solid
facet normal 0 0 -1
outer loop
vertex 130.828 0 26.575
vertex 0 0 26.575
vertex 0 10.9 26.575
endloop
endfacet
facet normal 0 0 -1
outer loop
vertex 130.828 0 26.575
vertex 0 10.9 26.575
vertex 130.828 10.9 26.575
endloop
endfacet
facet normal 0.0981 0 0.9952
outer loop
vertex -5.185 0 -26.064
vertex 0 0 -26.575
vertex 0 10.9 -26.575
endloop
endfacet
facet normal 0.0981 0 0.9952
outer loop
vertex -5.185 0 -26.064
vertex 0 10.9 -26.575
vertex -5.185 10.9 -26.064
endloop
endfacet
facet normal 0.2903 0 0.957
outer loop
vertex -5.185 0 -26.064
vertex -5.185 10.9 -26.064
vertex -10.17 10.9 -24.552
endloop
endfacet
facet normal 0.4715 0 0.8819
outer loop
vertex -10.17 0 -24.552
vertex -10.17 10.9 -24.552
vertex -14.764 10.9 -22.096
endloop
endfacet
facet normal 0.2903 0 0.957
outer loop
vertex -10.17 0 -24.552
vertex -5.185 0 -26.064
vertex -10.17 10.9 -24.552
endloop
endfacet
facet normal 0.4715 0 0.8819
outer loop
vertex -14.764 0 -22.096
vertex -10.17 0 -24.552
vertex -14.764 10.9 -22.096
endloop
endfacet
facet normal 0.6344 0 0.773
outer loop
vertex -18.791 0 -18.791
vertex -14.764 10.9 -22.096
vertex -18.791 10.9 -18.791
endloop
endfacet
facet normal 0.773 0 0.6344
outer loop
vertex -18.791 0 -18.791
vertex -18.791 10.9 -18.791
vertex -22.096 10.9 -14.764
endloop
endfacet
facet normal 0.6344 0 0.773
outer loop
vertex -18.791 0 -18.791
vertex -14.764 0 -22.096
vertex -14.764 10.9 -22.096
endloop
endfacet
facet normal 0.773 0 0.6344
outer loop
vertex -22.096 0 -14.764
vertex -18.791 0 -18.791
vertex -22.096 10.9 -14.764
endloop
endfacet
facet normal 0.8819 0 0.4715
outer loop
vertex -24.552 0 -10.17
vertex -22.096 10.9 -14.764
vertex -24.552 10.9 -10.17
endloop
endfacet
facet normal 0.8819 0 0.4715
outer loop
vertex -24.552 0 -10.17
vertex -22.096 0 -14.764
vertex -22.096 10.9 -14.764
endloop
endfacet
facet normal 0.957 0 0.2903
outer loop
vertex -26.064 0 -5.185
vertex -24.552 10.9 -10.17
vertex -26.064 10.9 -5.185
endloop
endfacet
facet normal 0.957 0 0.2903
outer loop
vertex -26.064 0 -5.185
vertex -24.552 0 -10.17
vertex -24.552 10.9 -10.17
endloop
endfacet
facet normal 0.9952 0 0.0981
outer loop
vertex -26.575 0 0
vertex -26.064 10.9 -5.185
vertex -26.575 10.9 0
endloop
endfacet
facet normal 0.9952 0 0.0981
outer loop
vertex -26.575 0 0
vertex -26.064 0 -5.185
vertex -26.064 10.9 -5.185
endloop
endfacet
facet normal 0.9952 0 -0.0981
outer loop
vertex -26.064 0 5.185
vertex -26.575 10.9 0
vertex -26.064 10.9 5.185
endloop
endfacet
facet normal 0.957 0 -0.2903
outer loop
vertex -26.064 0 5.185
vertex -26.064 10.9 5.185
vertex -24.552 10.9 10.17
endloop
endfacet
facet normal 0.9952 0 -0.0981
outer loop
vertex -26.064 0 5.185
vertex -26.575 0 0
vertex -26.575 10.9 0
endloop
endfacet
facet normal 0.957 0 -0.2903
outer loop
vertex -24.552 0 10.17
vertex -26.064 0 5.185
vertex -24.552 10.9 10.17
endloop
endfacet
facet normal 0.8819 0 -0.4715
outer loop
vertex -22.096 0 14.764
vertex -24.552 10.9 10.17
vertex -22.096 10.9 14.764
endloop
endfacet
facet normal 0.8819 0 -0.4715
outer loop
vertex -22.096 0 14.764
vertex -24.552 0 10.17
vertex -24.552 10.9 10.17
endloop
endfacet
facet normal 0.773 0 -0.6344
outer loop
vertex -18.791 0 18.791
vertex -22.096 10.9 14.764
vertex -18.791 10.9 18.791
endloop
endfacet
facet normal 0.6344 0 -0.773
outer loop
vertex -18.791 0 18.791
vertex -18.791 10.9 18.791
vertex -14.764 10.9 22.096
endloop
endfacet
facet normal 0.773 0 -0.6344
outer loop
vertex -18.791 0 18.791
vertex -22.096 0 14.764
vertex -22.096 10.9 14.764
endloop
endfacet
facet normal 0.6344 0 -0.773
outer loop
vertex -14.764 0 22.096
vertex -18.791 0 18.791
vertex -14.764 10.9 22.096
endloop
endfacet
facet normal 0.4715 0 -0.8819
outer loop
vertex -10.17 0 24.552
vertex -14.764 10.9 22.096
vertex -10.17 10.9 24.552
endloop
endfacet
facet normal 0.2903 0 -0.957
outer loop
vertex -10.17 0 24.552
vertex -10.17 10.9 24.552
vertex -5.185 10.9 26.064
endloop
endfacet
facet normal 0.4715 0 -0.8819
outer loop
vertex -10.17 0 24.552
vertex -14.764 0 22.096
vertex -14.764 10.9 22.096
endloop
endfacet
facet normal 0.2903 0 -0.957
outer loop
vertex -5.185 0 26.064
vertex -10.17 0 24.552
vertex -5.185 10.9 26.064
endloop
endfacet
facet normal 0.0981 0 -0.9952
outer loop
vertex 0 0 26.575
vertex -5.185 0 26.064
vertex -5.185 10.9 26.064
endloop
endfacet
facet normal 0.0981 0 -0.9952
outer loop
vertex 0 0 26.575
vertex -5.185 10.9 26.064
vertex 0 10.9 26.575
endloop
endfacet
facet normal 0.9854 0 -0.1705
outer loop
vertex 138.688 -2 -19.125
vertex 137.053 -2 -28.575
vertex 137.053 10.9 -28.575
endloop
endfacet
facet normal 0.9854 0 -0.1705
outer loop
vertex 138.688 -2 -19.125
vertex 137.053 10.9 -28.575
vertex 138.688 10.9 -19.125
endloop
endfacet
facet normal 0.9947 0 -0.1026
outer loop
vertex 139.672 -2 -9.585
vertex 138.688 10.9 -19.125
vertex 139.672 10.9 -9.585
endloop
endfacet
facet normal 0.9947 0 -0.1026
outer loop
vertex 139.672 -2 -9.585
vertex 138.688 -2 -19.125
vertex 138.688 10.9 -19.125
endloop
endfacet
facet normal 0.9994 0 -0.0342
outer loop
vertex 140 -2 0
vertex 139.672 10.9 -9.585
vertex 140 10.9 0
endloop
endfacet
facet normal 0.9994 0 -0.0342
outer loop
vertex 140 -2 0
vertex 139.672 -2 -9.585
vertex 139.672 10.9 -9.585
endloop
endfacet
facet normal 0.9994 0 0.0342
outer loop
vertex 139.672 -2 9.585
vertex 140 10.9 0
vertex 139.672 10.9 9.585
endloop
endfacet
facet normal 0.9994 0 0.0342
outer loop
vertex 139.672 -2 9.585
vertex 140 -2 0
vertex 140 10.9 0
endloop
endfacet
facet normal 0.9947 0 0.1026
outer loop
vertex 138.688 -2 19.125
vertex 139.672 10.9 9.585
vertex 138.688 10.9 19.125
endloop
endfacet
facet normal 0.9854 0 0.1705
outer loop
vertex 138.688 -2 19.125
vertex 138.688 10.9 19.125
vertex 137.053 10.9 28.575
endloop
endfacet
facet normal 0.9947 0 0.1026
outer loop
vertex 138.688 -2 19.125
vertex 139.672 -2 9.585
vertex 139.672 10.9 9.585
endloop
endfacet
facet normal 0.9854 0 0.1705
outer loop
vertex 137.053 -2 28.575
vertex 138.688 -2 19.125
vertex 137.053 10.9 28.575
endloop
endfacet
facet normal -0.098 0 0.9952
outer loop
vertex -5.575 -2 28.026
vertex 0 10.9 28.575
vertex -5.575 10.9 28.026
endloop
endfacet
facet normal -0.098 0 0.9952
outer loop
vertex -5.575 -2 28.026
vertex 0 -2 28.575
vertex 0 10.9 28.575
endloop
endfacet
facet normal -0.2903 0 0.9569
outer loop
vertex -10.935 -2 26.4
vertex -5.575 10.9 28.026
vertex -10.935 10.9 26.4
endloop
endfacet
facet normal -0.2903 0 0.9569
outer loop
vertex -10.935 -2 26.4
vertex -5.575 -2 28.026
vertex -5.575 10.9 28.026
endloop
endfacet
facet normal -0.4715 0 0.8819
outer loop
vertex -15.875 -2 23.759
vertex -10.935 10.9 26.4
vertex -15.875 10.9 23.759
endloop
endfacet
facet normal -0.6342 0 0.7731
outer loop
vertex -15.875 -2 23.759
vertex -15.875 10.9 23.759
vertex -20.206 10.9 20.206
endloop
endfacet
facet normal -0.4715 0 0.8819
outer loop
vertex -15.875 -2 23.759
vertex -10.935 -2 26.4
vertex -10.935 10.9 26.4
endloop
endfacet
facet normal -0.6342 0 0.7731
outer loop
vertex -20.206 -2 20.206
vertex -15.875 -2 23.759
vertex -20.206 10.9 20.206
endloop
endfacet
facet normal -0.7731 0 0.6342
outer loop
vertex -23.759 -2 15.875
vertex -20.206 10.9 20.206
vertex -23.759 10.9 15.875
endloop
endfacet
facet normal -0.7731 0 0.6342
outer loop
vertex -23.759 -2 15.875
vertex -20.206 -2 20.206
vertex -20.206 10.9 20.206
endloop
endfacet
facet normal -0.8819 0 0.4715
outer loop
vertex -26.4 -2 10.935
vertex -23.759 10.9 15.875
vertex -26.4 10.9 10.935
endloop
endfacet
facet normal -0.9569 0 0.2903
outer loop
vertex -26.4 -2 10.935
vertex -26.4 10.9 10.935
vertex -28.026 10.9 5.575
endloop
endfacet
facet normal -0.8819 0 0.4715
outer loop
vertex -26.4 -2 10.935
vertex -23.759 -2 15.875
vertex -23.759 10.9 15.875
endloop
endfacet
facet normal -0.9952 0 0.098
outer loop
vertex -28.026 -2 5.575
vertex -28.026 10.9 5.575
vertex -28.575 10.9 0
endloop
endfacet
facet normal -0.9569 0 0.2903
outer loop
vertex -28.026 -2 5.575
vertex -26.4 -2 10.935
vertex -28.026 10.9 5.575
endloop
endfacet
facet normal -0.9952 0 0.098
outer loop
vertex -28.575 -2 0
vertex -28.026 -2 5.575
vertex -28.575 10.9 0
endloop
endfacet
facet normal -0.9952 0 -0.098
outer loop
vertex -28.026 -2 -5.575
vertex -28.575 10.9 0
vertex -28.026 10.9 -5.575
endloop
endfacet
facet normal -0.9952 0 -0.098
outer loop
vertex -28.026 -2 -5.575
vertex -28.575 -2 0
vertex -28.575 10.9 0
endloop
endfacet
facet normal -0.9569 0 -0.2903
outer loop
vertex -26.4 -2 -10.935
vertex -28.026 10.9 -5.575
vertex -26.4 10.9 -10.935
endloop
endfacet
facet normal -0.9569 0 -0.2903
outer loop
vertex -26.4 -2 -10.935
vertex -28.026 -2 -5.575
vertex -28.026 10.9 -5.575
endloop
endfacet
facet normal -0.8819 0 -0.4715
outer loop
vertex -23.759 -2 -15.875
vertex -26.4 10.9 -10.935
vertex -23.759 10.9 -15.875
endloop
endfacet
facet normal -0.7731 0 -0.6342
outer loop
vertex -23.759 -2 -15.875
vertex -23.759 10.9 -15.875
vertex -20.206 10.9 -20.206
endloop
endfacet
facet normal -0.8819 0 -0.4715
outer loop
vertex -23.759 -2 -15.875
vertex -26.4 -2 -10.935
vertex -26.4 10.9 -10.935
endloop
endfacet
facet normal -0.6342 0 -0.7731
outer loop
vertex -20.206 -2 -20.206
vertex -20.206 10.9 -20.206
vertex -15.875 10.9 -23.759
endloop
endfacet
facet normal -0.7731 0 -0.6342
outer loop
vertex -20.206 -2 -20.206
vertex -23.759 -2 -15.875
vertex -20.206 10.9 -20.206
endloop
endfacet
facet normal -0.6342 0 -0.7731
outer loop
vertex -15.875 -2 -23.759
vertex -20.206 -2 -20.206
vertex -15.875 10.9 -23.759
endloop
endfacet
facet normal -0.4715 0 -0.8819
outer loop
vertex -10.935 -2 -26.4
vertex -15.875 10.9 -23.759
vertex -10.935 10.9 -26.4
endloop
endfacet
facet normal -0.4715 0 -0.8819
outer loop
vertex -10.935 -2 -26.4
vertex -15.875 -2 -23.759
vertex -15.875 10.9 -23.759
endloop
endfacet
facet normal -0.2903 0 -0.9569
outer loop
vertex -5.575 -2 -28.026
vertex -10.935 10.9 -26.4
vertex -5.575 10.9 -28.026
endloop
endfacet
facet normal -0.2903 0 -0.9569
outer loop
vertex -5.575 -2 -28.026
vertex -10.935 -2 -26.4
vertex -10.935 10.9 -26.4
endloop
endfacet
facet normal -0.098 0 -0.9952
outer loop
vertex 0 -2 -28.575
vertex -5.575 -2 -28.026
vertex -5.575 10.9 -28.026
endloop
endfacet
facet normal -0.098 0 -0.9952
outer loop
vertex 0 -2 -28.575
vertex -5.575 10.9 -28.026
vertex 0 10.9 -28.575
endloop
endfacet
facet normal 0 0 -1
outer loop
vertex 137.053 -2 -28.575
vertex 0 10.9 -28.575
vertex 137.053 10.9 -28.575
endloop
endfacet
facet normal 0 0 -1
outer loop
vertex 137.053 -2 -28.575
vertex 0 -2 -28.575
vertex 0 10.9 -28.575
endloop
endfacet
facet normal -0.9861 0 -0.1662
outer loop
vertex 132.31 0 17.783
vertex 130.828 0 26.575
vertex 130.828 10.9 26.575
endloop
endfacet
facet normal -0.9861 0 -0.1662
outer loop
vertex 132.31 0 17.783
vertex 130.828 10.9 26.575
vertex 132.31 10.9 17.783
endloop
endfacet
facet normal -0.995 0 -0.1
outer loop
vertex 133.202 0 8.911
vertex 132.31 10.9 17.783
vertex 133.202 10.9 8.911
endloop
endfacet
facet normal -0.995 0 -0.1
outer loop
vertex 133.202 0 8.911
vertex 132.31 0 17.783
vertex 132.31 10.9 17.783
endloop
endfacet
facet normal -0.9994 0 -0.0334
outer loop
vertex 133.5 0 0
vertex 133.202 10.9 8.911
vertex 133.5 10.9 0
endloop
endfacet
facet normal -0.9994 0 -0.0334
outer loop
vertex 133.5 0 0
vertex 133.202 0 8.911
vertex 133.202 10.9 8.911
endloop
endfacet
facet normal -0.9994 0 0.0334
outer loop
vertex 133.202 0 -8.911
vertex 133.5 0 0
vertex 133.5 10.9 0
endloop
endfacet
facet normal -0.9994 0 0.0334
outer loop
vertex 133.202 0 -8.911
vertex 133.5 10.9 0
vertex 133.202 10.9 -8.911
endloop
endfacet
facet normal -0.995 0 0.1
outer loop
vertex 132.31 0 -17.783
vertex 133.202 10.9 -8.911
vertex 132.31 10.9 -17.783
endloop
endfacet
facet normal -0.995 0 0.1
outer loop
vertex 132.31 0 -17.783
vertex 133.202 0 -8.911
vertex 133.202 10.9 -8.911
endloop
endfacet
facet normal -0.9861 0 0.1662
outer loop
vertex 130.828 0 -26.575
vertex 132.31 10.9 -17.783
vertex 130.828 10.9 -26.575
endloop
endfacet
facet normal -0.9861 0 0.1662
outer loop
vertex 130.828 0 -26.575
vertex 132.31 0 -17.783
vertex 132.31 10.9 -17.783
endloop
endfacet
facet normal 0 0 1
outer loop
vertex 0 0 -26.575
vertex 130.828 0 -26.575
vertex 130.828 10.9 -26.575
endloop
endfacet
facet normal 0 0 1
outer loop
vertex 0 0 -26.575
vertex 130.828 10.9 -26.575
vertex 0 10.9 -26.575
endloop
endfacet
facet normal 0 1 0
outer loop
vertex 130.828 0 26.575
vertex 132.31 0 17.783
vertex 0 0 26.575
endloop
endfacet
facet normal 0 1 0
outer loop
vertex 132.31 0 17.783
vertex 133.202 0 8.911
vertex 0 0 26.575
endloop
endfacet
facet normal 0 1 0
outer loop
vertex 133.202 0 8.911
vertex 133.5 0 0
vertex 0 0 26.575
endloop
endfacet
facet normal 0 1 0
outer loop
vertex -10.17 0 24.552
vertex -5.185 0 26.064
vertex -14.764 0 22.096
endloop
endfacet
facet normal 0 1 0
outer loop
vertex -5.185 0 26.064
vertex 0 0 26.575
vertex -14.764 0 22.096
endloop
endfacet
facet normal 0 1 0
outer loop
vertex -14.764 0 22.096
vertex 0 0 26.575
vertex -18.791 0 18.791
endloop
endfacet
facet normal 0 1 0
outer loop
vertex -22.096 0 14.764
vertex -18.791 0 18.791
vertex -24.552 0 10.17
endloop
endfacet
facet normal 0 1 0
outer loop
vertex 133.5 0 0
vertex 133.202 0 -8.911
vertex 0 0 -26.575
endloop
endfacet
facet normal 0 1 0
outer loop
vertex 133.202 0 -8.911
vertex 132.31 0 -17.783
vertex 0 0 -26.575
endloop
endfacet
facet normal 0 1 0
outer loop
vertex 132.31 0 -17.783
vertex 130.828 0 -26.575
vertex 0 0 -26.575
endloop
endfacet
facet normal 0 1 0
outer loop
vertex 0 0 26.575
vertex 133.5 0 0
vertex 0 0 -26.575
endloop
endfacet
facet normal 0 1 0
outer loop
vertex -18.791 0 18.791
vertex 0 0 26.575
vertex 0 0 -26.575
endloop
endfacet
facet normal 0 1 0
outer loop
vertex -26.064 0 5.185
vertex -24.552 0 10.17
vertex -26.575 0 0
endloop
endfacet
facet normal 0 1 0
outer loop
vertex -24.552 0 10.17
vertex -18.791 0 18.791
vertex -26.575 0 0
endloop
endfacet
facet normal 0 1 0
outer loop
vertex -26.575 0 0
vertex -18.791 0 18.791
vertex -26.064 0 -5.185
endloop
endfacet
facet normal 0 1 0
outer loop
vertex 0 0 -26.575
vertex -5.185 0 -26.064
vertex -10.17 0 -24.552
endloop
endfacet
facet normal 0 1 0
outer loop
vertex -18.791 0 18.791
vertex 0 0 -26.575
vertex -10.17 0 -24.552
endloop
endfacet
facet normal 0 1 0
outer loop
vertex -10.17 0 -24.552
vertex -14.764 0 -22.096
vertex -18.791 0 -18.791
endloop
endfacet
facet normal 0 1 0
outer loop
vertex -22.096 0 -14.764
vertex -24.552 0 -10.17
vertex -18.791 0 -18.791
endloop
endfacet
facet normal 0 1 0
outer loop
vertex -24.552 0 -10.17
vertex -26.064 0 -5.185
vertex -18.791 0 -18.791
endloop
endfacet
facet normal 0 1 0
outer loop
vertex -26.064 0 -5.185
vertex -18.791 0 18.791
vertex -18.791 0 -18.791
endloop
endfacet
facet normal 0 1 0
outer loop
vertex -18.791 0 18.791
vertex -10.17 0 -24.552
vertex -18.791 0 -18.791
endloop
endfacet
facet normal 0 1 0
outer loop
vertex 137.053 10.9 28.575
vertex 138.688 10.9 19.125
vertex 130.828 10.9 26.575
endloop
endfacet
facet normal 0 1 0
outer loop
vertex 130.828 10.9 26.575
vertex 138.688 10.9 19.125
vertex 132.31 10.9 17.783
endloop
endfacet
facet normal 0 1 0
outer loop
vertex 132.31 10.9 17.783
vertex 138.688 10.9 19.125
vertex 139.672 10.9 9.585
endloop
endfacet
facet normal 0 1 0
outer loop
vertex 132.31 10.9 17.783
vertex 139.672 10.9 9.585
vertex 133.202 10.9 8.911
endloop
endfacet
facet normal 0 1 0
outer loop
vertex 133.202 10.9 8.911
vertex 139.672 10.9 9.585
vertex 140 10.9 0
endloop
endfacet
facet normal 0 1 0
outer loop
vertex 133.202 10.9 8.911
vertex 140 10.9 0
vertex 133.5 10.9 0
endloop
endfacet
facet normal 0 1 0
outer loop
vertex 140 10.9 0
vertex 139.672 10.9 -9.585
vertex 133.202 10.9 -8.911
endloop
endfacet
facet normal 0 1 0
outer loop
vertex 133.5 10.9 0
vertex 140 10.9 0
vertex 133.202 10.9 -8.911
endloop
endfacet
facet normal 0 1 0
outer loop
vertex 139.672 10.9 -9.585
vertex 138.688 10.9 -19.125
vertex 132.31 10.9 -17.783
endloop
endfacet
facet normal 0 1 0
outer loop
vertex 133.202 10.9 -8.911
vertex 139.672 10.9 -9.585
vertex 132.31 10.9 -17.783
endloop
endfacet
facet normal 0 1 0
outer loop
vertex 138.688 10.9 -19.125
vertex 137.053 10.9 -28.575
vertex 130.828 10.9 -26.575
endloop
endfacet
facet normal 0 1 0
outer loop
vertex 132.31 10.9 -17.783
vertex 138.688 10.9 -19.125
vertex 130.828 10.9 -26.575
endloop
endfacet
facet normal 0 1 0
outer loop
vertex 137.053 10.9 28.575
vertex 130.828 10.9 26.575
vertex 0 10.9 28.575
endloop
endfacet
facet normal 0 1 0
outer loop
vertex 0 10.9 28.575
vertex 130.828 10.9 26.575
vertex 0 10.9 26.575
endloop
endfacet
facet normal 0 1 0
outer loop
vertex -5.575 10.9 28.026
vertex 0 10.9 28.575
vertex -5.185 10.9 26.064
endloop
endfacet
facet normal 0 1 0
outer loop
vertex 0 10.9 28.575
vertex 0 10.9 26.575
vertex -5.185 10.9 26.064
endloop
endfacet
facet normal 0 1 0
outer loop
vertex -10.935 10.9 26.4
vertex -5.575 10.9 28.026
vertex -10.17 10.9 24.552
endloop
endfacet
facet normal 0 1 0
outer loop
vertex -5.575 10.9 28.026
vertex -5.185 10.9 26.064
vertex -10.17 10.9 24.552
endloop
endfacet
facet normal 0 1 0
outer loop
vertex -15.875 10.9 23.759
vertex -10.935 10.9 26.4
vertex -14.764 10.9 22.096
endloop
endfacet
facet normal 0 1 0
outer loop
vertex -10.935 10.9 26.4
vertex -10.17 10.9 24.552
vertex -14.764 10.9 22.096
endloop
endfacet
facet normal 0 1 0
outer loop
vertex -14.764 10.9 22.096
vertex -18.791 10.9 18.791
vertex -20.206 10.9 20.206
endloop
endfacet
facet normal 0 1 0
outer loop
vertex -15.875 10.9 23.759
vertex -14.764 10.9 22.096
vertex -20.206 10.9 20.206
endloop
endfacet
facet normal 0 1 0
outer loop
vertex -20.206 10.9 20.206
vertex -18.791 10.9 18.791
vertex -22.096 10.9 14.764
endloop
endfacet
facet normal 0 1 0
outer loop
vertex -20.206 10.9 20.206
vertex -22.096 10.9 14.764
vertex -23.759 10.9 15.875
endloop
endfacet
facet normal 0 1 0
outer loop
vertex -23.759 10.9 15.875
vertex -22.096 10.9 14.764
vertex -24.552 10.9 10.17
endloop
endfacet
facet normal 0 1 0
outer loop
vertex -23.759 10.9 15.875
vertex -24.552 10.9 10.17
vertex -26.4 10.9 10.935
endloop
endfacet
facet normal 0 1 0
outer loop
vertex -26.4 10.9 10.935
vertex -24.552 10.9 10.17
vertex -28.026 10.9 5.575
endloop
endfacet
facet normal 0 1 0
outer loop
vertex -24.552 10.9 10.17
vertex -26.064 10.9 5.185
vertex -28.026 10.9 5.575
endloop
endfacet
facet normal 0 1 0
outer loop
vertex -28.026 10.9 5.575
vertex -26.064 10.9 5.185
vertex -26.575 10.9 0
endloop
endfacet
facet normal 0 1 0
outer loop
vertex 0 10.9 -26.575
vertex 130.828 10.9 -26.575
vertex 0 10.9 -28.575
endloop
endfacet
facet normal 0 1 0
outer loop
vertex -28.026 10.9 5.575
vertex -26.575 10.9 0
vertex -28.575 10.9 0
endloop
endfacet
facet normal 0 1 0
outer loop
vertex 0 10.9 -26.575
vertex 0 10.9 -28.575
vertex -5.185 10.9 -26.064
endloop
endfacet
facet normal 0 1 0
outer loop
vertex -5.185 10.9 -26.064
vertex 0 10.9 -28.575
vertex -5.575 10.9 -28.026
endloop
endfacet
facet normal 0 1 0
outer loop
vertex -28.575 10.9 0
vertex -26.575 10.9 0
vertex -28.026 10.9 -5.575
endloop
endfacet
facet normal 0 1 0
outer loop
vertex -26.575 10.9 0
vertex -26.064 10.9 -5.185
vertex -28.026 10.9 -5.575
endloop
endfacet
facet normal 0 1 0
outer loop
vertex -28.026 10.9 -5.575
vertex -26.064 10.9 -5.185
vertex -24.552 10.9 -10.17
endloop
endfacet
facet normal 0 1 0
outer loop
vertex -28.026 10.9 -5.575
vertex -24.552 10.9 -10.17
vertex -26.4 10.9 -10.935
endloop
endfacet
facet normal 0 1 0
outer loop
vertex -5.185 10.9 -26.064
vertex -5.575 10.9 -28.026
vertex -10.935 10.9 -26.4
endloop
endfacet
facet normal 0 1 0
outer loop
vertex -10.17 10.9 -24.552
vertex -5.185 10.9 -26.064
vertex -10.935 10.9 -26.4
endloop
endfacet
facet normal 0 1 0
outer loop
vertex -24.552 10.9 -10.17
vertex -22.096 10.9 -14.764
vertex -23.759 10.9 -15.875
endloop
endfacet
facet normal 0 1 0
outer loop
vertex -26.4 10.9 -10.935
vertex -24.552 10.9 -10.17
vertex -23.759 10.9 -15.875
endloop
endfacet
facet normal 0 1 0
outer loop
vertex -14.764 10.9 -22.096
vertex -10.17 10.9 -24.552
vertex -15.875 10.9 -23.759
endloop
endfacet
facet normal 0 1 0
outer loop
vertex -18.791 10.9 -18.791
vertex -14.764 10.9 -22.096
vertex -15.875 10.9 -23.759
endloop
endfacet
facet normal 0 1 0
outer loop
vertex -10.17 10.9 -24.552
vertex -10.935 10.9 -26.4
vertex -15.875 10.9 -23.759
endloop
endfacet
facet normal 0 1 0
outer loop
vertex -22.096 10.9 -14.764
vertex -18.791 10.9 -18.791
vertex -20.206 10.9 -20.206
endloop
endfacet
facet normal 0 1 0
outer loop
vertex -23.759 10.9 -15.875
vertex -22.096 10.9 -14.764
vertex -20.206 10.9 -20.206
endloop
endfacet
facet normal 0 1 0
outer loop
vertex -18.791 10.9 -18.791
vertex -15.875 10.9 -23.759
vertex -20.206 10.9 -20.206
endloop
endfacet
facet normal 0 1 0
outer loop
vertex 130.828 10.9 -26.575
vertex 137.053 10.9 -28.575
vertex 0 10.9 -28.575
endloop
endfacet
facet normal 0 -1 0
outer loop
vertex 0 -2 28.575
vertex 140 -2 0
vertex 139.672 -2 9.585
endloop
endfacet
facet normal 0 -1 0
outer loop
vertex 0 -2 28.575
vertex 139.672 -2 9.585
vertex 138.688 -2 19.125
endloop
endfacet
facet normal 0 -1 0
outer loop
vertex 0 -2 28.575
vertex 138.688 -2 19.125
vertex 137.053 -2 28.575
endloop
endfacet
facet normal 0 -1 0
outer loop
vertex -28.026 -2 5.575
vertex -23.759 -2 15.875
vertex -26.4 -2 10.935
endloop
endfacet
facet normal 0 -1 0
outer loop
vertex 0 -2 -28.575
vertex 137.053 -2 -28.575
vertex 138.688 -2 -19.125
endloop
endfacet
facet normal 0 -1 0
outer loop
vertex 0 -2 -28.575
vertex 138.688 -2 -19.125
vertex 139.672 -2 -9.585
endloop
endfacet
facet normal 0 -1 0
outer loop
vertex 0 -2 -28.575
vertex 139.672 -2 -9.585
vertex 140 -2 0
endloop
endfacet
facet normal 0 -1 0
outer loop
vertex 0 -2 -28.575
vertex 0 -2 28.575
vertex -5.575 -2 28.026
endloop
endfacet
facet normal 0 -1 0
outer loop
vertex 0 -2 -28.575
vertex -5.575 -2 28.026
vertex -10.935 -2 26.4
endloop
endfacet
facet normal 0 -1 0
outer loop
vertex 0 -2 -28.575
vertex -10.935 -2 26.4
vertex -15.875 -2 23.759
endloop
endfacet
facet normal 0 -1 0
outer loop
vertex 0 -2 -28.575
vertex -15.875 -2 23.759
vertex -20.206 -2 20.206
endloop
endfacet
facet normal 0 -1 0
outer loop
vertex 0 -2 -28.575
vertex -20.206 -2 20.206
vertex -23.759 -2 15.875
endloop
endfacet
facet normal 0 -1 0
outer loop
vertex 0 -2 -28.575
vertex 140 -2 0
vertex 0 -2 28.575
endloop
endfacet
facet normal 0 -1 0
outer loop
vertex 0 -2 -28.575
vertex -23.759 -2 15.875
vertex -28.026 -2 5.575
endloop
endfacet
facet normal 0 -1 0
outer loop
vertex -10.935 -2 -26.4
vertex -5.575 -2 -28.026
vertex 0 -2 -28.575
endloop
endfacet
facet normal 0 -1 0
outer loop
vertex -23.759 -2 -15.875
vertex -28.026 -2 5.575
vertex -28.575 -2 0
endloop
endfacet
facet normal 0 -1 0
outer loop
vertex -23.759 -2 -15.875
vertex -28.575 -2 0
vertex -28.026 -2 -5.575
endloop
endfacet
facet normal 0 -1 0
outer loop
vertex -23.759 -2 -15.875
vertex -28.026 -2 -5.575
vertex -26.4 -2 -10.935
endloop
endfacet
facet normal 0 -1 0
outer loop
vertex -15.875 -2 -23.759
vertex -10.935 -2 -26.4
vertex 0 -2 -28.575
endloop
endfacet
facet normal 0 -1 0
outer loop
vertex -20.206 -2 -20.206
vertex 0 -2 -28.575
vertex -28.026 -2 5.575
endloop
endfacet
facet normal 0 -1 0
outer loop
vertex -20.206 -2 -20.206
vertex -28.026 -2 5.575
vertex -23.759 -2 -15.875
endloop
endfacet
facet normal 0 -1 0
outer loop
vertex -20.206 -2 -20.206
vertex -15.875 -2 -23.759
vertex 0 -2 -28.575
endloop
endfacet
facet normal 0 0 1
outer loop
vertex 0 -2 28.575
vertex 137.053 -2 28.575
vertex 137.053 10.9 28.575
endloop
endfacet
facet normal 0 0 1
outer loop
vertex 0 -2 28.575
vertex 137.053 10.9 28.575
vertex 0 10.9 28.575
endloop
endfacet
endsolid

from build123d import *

# Parameters (mm, degrees)
BOSS_EXTRUDE2_DEPTH = 2
BOSS_EXTRUDE3_START = 10.9
BOSS_EXTRUDE3_DEPTH = 10.9


with BuildPart() as part:
    # Sketch1 → Boss-Extrude2 (new body)
    with BuildSketch(Plane(origin=(0, 0, 0), x_dir=(1, 0, 0), z_dir=(0, 1, 0))):
        with BuildLine():
            Line((0, 28.575), (137.052797764, 28.575))
            ThreePointArc((137.052797764, 28.575), (139.26125033, 14.36329198), (140, 0))
            ThreePointArc((140, 0), (139.26125033, -14.36329198), (137.052797764, -28.575))
            Line((137.052797764, -28.575), (0, -28.575))
            ThreePointArc((0, -28.575), (-28.575, 0), (0, 28.575))
        make_face()
    extrude(amount=-BOSS_EXTRUDE2_DEPTH)

    # Sketch1<14> → Boss-Extrude3 (add)
    with BuildSketch(Plane(origin=(0, 0, 0), x_dir=(1, 0, 0), z_dir=(0, 1, 0)).offset(BOSS_EXTRUDE3_START)):
        with BuildLine():
            Line((0, 28.575), (137.052797764, 28.575))
            ThreePointArc((137.052797764, 28.575), (139.26125033, 14.36329198), (140, 0))
            ThreePointArc((140, 0), (139.26125033, -14.36329198), (137.052797764, -28.575))
            Line((137.052797764, -28.575), (0, -28.575))
            ThreePointArc((0, -28.575), (-28.575, 0), (0, 28.575))
        make_face()
        with BuildLine():
            Line((0, -26.575), (130.828205579, -26.575))
            ThreePointArc((130.828205579, -26.575), (132.830371988, -13.354485299), (133.5, 0))
            ThreePointArc((133.5, 0), (132.830371988, 13.354485299), (130.828205579, 26.575))
            Line((130.828205579, 26.575), (0, 26.575))
            ThreePointArc((0, 26.575), (-26.575, 0), (0, -26.575))
        make_face(mode=Mode.SUBTRACT)
    extrude(amount=-BOSS_EXTRUDE3_DEPTH)


solid = part.part
